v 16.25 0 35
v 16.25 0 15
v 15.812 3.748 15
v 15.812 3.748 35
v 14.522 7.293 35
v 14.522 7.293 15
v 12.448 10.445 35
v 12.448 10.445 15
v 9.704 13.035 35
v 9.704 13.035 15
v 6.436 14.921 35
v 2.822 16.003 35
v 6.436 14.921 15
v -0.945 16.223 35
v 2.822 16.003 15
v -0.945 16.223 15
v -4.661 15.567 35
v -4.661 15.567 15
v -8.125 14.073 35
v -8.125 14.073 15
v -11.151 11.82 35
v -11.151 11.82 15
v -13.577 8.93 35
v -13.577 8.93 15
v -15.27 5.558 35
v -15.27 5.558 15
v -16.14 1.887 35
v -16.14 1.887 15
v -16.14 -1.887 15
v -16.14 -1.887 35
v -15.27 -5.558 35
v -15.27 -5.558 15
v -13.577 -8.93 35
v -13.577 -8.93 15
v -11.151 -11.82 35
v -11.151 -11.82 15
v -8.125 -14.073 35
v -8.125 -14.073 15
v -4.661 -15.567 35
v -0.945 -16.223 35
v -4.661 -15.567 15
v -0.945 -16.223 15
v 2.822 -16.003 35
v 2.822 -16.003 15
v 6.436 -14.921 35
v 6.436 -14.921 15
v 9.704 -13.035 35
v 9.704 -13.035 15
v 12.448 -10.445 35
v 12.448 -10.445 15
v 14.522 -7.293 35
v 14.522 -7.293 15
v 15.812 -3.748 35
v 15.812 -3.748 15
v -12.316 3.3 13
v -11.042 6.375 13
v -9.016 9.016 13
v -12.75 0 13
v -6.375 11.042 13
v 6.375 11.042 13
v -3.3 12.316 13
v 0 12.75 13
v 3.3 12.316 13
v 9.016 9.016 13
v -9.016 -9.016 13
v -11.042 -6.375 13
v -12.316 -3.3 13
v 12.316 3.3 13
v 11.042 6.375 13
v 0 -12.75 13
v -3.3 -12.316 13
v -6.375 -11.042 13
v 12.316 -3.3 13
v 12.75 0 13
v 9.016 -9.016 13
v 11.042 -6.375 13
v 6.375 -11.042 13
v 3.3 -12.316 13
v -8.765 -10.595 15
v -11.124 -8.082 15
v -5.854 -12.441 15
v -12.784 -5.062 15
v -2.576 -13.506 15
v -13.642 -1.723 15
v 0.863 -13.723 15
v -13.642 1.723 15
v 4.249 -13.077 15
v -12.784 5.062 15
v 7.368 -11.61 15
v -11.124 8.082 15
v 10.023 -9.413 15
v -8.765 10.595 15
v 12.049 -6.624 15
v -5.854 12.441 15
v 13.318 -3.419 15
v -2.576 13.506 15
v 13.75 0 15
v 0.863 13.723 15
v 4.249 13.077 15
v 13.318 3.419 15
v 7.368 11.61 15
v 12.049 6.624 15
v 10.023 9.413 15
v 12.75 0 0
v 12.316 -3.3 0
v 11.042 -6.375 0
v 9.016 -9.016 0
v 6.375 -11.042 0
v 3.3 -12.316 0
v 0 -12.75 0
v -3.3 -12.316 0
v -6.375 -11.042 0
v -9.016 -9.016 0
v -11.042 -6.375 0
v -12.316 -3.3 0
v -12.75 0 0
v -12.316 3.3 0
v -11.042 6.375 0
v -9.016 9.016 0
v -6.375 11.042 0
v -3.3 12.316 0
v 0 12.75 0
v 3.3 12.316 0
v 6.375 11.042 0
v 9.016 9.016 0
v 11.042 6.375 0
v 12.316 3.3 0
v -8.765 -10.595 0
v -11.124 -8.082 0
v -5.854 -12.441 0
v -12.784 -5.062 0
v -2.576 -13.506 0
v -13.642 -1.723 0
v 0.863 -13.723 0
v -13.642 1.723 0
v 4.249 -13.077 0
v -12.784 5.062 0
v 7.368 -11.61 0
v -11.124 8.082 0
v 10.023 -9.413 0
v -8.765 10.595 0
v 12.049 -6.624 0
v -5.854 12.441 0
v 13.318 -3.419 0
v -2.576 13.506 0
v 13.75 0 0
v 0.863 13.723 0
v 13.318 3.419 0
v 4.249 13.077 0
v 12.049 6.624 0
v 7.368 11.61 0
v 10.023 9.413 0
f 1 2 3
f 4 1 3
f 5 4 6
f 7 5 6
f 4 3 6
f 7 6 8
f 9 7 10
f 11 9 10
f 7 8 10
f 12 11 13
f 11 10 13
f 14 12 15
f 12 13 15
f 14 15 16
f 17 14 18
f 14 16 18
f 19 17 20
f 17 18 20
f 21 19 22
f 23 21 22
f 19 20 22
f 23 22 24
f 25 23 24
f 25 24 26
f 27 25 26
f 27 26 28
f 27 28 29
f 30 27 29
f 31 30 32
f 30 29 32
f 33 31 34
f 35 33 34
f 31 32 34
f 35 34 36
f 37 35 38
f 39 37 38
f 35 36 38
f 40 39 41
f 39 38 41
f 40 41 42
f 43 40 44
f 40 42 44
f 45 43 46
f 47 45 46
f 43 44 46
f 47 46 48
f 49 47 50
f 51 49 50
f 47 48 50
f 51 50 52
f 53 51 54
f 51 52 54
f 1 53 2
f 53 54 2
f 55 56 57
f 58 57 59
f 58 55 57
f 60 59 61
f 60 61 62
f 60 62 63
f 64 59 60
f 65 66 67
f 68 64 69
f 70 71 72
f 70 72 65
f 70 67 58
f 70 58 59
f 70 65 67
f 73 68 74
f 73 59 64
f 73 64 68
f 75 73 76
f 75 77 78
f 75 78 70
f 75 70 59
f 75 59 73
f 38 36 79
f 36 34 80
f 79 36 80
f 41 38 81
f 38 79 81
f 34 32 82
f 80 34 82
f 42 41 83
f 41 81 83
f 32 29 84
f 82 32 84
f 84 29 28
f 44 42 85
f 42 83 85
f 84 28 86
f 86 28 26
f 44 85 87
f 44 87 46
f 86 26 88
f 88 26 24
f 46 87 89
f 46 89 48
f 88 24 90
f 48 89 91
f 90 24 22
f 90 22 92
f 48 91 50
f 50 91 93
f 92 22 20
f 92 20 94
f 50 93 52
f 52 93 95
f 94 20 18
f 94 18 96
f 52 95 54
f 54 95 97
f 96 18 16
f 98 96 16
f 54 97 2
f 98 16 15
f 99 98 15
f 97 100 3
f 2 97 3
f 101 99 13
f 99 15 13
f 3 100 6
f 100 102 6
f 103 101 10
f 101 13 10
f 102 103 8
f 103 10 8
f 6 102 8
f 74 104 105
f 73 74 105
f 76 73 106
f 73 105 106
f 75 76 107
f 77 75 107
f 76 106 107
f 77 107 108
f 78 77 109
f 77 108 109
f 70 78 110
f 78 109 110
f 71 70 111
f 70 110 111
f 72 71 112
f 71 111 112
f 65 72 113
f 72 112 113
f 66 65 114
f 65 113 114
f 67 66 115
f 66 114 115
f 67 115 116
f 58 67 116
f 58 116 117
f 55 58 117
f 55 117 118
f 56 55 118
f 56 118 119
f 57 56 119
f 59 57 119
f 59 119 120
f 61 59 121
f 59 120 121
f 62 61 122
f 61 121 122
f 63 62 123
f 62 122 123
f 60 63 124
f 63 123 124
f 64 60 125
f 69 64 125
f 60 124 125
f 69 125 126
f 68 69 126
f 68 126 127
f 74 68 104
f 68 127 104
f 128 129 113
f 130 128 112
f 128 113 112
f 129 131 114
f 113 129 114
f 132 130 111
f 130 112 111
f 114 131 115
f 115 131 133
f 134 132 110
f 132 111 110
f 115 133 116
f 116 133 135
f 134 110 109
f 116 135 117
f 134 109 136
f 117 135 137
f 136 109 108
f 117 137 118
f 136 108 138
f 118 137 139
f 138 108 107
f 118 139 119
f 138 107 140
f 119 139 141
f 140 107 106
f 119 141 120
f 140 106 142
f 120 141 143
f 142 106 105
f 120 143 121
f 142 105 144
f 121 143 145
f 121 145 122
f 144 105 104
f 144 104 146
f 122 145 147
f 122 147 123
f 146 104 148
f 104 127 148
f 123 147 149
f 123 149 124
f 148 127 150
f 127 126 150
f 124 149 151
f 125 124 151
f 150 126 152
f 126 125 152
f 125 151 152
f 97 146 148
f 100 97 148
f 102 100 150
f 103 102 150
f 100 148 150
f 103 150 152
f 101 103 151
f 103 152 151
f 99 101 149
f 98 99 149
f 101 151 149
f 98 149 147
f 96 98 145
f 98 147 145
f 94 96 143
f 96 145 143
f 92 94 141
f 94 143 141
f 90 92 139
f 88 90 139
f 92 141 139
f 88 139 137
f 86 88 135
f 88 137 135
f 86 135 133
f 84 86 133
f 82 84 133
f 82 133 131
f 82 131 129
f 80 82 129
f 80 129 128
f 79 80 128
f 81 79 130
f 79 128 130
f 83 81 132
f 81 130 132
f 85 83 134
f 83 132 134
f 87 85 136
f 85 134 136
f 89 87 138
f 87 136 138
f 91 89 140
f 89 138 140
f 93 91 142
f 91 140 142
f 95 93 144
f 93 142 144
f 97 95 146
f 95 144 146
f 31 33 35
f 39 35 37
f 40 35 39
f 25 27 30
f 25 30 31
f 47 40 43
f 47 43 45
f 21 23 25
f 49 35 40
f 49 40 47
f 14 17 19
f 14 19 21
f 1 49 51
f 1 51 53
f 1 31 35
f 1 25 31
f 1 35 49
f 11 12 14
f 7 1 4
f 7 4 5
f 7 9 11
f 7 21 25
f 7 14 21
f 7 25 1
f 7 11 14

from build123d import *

# Parameters (mm, degrees)
SKETCH_R     = 13.75
PAD_DEPTH    = 15
SKETCH001_R  = 12.75
POCKET_DEPTH = 13
SKETCH002_R  = 16.25
PAD001_DEPTH = 20


with BuildPart() as part:
    # Sketch → Pad (new body)
    with BuildSketch(Plane.XY):
        Circle(SKETCH_R)
    extrude(amount=PAD_DEPTH)

    # Sketch001 (on Face2 of Pad) → Pocket (cut)
    with BuildSketch(Plane(origin=(0, 0, 0), x_dir=(1, 0, 0), z_dir=(0, 0, -1))):
        Circle(SKETCH001_R)
    extrude(amount=-POCKET_DEPTH, mode=Mode.SUBTRACT)

    # Sketch002 (on Face3 of Pocket) → Pad001 (join)
    with BuildSketch(Plane.XY.offset(15)):
        Circle(SKETCH002_R)
    extrude(amount=PAD001_DEPTH)


solid = part.part
